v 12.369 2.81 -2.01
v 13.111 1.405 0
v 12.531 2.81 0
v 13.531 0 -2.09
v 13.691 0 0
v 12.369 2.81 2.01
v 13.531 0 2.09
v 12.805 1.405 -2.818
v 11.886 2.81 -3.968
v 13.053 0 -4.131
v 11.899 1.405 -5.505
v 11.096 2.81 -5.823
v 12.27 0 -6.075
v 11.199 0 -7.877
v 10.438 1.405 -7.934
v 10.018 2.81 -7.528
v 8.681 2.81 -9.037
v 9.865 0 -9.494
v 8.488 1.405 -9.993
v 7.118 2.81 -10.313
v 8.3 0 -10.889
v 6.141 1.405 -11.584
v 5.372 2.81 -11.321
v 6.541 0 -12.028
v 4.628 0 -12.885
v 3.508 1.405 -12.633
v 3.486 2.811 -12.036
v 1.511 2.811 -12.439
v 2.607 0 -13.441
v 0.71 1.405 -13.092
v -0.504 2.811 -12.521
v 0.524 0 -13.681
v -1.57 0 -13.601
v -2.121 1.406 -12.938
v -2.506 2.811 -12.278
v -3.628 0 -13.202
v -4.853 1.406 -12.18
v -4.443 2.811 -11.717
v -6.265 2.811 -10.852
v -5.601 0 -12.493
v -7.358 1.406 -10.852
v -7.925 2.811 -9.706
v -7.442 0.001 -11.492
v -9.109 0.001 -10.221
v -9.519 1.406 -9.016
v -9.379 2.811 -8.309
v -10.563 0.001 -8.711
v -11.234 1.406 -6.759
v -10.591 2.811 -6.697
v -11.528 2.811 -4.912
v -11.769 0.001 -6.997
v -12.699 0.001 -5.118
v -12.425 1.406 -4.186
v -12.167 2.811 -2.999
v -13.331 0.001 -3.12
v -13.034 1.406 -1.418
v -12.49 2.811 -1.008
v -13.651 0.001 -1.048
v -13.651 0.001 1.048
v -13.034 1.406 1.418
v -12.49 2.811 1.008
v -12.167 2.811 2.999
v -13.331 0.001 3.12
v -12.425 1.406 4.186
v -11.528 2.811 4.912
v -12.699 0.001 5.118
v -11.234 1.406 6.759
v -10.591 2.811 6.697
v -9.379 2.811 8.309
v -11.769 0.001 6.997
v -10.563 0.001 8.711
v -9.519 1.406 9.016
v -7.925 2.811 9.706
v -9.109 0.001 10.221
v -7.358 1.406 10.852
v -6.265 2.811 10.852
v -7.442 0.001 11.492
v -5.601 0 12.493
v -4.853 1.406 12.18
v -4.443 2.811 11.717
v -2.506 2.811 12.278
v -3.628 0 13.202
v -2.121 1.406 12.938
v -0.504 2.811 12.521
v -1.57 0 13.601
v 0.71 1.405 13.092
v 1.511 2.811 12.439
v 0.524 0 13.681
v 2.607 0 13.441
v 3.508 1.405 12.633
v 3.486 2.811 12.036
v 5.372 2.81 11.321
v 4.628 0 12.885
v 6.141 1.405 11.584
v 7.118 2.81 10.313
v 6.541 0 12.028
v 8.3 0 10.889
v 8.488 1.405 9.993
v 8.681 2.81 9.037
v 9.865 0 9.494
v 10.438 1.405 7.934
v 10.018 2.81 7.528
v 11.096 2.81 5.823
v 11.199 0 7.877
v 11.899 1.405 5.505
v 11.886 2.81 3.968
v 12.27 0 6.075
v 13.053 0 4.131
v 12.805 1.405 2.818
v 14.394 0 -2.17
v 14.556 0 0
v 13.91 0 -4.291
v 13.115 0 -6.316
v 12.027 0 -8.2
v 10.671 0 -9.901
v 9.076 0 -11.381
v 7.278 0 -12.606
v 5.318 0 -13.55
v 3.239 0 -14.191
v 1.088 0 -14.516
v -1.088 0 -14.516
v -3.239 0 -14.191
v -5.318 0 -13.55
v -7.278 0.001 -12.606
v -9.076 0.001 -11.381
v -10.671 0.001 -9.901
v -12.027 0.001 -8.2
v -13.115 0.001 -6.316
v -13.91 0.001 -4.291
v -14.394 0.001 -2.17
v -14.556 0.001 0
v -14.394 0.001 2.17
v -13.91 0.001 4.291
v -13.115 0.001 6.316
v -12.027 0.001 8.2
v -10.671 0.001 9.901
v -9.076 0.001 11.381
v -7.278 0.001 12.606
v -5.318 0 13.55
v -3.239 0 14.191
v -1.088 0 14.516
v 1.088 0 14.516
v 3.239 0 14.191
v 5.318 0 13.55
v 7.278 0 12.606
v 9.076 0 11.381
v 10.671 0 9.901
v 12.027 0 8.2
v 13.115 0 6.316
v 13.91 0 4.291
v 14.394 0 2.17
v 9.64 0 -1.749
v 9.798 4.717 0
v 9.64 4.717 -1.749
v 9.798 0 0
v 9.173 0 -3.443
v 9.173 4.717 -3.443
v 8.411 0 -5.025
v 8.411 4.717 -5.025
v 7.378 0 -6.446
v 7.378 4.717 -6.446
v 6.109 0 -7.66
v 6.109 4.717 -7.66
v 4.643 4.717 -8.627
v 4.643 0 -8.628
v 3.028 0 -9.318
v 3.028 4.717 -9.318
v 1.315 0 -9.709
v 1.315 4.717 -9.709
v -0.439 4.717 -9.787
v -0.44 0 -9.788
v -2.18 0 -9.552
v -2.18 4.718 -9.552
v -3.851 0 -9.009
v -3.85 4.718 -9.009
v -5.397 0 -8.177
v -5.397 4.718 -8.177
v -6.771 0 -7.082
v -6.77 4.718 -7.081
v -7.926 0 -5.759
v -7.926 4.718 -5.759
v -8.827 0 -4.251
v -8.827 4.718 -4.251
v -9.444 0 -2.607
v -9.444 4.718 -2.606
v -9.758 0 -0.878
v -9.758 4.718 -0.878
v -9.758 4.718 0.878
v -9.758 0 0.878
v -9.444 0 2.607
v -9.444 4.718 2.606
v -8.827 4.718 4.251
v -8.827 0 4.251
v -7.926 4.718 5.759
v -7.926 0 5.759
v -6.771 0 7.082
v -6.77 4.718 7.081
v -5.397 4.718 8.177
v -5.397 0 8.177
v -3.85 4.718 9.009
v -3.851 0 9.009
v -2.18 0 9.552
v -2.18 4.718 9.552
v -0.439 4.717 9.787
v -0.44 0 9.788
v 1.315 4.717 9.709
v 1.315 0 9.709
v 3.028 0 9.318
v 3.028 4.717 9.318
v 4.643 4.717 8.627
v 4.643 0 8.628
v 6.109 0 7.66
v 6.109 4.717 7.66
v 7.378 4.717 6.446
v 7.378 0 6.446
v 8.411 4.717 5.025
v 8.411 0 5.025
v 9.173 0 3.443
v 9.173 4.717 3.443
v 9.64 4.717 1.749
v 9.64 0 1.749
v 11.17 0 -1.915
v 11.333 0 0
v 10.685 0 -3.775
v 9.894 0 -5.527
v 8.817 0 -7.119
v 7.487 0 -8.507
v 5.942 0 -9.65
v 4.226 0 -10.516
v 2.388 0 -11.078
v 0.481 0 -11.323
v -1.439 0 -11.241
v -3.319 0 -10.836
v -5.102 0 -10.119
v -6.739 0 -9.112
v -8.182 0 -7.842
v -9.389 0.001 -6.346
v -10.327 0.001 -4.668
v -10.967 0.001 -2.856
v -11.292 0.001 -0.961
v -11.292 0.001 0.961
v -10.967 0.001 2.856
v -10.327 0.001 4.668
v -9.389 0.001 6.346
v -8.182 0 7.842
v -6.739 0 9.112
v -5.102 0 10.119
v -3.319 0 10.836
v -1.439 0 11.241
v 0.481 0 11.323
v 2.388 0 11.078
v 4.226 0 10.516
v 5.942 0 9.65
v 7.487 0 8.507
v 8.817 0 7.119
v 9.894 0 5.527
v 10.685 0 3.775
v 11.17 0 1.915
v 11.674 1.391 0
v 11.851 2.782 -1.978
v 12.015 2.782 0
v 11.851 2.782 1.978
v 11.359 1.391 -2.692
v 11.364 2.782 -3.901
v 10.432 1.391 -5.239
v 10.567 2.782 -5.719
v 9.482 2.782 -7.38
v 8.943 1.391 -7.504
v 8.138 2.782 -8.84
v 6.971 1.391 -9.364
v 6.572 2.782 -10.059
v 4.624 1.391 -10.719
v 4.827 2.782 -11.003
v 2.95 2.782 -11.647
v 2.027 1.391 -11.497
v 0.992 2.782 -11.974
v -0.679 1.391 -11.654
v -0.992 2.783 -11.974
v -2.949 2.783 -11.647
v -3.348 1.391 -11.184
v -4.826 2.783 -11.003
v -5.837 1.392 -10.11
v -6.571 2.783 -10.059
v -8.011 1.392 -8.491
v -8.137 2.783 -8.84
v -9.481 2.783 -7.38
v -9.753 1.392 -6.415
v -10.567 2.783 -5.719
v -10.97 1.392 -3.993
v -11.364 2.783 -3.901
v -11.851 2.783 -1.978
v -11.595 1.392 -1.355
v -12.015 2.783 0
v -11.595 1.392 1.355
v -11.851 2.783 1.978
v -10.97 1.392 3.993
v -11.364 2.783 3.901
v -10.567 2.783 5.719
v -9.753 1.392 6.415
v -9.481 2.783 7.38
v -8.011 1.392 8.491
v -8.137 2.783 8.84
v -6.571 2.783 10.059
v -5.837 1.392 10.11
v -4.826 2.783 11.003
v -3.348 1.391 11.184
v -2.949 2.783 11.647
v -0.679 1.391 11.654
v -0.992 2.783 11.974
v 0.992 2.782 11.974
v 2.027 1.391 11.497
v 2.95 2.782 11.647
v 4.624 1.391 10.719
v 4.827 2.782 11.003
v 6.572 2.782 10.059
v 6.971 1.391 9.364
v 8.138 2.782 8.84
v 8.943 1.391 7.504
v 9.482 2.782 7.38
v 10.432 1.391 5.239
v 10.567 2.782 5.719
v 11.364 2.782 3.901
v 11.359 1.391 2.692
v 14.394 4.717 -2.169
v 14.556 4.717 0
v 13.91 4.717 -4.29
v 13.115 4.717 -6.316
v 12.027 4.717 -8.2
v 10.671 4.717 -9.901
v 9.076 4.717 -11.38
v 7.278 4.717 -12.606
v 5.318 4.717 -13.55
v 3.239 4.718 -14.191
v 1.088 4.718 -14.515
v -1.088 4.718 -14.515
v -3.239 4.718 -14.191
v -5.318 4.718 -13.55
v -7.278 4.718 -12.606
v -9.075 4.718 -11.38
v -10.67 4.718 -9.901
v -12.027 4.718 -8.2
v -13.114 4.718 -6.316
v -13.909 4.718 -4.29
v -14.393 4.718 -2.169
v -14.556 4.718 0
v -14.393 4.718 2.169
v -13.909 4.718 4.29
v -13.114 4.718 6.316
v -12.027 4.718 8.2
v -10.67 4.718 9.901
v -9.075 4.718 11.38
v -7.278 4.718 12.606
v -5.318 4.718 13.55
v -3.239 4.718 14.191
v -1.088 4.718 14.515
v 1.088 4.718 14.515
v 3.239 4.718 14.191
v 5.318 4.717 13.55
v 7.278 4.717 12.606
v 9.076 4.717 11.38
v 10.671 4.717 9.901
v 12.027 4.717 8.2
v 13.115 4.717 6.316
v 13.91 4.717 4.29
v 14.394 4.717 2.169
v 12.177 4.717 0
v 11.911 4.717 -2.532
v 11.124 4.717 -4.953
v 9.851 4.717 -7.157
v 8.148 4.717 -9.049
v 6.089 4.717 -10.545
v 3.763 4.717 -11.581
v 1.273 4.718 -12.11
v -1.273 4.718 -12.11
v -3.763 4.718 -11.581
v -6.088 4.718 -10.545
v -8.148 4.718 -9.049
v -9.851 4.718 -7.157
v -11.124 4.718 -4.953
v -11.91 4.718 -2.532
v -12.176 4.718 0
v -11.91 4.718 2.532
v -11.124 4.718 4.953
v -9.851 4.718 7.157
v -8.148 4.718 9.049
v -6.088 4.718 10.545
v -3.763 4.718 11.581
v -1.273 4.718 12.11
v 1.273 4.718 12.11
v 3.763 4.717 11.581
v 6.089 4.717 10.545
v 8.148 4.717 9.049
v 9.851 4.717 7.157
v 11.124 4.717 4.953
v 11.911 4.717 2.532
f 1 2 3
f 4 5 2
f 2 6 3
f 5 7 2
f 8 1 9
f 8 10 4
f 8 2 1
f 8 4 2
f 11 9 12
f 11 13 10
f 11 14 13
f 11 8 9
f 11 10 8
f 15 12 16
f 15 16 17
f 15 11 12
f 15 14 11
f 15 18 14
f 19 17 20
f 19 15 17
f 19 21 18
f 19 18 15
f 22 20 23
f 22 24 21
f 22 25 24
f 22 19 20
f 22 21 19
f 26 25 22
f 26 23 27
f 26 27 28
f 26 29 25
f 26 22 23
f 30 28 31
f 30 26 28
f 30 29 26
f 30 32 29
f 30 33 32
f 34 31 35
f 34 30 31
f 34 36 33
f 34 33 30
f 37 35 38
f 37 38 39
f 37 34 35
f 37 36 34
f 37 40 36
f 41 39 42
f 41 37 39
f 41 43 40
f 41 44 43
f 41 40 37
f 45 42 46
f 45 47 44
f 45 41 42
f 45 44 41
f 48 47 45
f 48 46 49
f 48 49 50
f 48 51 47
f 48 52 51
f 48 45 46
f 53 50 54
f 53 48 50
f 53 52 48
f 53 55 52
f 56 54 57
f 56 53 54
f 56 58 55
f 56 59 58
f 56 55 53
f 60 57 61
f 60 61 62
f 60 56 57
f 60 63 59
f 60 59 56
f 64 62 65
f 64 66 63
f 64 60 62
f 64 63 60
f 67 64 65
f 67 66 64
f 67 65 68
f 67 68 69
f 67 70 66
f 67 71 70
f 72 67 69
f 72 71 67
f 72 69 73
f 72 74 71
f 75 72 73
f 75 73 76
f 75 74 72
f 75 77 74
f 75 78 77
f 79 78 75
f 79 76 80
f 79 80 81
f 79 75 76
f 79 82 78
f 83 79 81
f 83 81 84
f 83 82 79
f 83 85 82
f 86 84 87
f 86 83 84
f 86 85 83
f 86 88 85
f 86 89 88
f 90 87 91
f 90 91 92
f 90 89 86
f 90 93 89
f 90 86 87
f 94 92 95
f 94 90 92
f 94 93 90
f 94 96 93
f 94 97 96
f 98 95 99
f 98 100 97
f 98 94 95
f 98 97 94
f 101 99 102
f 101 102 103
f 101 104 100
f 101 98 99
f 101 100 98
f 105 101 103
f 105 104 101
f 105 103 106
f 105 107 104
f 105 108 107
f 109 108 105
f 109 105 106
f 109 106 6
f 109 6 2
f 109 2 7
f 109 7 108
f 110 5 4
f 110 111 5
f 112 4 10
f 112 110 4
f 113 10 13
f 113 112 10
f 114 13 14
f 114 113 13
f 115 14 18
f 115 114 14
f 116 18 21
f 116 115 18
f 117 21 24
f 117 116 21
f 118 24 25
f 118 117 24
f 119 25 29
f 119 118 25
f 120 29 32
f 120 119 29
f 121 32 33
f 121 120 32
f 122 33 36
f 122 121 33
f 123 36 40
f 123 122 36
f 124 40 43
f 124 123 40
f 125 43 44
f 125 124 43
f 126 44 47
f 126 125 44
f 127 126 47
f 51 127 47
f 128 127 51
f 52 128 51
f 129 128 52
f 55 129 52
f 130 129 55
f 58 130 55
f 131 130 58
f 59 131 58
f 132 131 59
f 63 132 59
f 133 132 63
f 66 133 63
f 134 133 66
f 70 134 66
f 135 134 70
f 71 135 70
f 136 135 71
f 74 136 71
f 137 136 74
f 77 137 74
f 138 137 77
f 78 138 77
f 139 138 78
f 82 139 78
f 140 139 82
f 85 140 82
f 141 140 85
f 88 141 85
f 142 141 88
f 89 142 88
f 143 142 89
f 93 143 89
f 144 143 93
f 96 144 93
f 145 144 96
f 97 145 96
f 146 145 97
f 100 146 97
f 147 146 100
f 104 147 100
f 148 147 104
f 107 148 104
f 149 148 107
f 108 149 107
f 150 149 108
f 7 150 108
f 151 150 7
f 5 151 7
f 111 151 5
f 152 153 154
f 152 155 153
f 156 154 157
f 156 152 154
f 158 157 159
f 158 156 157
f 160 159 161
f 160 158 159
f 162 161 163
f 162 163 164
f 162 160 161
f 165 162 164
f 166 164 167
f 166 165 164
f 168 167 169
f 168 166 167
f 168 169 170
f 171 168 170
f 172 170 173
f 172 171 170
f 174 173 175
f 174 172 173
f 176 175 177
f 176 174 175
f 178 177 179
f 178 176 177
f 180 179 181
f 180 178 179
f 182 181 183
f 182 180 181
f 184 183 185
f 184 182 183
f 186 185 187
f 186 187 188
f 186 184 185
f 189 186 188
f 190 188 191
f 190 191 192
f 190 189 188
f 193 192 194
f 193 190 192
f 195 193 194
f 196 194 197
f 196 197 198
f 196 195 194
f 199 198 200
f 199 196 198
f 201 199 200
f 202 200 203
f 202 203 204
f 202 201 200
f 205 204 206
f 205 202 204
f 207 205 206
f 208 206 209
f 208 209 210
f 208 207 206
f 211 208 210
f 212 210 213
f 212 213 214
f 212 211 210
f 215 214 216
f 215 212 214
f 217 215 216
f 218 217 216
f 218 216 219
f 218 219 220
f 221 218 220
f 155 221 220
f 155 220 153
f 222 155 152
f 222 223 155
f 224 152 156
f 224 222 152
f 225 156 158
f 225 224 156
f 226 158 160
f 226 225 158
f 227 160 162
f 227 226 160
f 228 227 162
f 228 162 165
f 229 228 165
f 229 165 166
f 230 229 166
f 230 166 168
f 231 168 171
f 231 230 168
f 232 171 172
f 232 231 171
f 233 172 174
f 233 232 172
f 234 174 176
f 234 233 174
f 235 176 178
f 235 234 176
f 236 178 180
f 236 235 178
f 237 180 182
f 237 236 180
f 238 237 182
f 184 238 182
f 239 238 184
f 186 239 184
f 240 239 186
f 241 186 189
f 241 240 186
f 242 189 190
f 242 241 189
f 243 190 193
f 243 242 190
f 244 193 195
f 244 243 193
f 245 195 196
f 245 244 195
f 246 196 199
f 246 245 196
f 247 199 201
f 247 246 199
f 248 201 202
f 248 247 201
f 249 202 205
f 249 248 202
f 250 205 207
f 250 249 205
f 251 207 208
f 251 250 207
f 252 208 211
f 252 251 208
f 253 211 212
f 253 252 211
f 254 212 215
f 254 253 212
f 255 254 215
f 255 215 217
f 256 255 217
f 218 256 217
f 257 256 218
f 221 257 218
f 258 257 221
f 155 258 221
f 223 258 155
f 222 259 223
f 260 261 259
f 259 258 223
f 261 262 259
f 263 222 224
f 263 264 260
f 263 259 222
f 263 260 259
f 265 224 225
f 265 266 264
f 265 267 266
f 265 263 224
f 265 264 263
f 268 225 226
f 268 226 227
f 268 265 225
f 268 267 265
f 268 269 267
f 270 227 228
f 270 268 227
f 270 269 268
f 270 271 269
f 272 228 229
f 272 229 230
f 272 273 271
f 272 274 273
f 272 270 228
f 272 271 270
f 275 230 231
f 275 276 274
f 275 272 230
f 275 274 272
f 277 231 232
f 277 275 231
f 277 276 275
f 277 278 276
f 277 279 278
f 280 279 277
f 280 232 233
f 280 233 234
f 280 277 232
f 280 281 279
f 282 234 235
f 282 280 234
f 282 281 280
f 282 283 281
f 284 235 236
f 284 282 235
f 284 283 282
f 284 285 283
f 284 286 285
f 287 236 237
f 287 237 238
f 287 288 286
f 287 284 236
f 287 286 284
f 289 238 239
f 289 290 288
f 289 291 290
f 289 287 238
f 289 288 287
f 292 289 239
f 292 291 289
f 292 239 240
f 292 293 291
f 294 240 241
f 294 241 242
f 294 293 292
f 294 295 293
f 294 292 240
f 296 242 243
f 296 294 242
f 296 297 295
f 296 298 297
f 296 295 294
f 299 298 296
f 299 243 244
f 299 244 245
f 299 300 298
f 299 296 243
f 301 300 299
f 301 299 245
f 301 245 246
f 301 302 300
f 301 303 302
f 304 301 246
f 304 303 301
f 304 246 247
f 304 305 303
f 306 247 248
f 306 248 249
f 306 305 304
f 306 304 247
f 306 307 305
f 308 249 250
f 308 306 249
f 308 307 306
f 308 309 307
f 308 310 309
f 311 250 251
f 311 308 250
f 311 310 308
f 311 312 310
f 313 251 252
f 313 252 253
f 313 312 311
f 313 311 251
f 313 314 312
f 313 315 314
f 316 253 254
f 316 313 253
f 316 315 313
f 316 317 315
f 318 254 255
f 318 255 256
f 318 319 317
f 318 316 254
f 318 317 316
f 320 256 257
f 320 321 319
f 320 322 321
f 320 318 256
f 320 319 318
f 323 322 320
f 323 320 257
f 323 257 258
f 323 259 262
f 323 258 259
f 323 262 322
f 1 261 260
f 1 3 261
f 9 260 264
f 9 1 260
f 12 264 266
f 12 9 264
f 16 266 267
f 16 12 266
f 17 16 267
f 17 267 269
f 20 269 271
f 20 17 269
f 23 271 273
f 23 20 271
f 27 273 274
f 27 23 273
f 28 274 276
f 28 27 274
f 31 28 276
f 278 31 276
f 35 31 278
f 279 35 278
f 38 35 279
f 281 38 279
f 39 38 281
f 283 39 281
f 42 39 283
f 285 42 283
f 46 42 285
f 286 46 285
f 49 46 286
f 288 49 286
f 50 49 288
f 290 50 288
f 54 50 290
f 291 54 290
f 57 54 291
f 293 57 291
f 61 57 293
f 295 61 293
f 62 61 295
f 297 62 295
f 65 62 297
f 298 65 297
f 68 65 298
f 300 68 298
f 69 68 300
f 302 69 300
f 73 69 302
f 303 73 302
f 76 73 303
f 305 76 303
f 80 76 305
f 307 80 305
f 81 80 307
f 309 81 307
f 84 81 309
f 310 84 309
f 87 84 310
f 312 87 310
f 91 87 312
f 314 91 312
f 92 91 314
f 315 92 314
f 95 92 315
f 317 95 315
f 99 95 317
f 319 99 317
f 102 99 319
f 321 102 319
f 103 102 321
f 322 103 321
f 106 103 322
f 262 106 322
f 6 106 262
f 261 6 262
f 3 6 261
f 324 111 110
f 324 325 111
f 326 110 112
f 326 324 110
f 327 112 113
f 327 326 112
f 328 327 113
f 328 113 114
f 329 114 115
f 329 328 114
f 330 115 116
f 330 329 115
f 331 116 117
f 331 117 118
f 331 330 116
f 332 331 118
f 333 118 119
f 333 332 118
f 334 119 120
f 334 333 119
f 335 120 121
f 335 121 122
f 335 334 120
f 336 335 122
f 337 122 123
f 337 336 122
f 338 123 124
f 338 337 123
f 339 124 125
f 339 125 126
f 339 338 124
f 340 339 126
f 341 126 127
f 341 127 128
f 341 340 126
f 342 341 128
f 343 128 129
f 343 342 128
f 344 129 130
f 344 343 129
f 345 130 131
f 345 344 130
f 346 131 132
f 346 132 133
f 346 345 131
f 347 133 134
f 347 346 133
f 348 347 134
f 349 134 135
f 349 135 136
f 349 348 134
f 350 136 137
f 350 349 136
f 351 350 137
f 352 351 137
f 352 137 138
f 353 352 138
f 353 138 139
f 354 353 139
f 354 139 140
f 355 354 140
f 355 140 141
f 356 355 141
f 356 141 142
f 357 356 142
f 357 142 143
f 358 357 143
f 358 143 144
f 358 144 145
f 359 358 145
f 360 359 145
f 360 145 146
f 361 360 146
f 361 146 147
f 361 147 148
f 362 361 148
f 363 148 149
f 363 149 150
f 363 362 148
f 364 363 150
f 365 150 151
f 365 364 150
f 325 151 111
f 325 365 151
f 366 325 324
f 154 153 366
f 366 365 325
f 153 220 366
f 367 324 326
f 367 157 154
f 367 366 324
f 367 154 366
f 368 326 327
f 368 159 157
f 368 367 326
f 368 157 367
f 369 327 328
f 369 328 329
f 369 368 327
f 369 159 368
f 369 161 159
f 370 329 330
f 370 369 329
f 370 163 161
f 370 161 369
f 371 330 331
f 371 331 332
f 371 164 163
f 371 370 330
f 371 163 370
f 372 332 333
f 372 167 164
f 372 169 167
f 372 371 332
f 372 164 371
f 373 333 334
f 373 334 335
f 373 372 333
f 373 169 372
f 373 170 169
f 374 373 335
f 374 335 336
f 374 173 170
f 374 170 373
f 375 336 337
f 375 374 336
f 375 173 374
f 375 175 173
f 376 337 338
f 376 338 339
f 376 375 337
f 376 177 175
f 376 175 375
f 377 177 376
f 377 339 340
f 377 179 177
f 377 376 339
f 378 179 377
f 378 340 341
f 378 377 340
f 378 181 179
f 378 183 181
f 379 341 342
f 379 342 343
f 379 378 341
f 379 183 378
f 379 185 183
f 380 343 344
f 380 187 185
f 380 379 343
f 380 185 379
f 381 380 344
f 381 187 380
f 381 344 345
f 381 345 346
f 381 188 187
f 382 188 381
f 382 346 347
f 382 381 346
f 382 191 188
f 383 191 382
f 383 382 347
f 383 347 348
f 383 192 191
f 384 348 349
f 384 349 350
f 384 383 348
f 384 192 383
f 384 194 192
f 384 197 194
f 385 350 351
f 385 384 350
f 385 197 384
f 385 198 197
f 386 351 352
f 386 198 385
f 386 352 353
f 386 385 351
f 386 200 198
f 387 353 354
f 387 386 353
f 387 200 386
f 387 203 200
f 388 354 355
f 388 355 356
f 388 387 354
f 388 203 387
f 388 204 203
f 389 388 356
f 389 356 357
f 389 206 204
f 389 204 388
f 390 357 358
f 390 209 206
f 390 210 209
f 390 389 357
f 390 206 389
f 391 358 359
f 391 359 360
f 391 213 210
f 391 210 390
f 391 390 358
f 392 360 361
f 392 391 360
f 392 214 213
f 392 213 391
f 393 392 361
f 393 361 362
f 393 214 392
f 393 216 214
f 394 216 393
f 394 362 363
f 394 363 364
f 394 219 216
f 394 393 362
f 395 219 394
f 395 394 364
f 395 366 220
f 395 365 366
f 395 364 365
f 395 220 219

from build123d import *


with BuildPart() as part:
    # Çizim1 → Döndür1 (revolve)
    with BuildSketch(Plane.XY):
        Polygon((14.556330182, -0.000478985), (14.556330182, 4.716980057), (9.797530392, 4.716980057), (9.797530392, -0.000478985), (11.332803263, -0.000478985), (12.01520523, 2.781914958), (12.530984141, 2.810062352), (13.691331204, -0.000478985), align=None)
    revolve(axis=Axis((0, 0, 0), (4.8888323348204376e-05, 0.9999999988049659, 0)))


solid = part.part
